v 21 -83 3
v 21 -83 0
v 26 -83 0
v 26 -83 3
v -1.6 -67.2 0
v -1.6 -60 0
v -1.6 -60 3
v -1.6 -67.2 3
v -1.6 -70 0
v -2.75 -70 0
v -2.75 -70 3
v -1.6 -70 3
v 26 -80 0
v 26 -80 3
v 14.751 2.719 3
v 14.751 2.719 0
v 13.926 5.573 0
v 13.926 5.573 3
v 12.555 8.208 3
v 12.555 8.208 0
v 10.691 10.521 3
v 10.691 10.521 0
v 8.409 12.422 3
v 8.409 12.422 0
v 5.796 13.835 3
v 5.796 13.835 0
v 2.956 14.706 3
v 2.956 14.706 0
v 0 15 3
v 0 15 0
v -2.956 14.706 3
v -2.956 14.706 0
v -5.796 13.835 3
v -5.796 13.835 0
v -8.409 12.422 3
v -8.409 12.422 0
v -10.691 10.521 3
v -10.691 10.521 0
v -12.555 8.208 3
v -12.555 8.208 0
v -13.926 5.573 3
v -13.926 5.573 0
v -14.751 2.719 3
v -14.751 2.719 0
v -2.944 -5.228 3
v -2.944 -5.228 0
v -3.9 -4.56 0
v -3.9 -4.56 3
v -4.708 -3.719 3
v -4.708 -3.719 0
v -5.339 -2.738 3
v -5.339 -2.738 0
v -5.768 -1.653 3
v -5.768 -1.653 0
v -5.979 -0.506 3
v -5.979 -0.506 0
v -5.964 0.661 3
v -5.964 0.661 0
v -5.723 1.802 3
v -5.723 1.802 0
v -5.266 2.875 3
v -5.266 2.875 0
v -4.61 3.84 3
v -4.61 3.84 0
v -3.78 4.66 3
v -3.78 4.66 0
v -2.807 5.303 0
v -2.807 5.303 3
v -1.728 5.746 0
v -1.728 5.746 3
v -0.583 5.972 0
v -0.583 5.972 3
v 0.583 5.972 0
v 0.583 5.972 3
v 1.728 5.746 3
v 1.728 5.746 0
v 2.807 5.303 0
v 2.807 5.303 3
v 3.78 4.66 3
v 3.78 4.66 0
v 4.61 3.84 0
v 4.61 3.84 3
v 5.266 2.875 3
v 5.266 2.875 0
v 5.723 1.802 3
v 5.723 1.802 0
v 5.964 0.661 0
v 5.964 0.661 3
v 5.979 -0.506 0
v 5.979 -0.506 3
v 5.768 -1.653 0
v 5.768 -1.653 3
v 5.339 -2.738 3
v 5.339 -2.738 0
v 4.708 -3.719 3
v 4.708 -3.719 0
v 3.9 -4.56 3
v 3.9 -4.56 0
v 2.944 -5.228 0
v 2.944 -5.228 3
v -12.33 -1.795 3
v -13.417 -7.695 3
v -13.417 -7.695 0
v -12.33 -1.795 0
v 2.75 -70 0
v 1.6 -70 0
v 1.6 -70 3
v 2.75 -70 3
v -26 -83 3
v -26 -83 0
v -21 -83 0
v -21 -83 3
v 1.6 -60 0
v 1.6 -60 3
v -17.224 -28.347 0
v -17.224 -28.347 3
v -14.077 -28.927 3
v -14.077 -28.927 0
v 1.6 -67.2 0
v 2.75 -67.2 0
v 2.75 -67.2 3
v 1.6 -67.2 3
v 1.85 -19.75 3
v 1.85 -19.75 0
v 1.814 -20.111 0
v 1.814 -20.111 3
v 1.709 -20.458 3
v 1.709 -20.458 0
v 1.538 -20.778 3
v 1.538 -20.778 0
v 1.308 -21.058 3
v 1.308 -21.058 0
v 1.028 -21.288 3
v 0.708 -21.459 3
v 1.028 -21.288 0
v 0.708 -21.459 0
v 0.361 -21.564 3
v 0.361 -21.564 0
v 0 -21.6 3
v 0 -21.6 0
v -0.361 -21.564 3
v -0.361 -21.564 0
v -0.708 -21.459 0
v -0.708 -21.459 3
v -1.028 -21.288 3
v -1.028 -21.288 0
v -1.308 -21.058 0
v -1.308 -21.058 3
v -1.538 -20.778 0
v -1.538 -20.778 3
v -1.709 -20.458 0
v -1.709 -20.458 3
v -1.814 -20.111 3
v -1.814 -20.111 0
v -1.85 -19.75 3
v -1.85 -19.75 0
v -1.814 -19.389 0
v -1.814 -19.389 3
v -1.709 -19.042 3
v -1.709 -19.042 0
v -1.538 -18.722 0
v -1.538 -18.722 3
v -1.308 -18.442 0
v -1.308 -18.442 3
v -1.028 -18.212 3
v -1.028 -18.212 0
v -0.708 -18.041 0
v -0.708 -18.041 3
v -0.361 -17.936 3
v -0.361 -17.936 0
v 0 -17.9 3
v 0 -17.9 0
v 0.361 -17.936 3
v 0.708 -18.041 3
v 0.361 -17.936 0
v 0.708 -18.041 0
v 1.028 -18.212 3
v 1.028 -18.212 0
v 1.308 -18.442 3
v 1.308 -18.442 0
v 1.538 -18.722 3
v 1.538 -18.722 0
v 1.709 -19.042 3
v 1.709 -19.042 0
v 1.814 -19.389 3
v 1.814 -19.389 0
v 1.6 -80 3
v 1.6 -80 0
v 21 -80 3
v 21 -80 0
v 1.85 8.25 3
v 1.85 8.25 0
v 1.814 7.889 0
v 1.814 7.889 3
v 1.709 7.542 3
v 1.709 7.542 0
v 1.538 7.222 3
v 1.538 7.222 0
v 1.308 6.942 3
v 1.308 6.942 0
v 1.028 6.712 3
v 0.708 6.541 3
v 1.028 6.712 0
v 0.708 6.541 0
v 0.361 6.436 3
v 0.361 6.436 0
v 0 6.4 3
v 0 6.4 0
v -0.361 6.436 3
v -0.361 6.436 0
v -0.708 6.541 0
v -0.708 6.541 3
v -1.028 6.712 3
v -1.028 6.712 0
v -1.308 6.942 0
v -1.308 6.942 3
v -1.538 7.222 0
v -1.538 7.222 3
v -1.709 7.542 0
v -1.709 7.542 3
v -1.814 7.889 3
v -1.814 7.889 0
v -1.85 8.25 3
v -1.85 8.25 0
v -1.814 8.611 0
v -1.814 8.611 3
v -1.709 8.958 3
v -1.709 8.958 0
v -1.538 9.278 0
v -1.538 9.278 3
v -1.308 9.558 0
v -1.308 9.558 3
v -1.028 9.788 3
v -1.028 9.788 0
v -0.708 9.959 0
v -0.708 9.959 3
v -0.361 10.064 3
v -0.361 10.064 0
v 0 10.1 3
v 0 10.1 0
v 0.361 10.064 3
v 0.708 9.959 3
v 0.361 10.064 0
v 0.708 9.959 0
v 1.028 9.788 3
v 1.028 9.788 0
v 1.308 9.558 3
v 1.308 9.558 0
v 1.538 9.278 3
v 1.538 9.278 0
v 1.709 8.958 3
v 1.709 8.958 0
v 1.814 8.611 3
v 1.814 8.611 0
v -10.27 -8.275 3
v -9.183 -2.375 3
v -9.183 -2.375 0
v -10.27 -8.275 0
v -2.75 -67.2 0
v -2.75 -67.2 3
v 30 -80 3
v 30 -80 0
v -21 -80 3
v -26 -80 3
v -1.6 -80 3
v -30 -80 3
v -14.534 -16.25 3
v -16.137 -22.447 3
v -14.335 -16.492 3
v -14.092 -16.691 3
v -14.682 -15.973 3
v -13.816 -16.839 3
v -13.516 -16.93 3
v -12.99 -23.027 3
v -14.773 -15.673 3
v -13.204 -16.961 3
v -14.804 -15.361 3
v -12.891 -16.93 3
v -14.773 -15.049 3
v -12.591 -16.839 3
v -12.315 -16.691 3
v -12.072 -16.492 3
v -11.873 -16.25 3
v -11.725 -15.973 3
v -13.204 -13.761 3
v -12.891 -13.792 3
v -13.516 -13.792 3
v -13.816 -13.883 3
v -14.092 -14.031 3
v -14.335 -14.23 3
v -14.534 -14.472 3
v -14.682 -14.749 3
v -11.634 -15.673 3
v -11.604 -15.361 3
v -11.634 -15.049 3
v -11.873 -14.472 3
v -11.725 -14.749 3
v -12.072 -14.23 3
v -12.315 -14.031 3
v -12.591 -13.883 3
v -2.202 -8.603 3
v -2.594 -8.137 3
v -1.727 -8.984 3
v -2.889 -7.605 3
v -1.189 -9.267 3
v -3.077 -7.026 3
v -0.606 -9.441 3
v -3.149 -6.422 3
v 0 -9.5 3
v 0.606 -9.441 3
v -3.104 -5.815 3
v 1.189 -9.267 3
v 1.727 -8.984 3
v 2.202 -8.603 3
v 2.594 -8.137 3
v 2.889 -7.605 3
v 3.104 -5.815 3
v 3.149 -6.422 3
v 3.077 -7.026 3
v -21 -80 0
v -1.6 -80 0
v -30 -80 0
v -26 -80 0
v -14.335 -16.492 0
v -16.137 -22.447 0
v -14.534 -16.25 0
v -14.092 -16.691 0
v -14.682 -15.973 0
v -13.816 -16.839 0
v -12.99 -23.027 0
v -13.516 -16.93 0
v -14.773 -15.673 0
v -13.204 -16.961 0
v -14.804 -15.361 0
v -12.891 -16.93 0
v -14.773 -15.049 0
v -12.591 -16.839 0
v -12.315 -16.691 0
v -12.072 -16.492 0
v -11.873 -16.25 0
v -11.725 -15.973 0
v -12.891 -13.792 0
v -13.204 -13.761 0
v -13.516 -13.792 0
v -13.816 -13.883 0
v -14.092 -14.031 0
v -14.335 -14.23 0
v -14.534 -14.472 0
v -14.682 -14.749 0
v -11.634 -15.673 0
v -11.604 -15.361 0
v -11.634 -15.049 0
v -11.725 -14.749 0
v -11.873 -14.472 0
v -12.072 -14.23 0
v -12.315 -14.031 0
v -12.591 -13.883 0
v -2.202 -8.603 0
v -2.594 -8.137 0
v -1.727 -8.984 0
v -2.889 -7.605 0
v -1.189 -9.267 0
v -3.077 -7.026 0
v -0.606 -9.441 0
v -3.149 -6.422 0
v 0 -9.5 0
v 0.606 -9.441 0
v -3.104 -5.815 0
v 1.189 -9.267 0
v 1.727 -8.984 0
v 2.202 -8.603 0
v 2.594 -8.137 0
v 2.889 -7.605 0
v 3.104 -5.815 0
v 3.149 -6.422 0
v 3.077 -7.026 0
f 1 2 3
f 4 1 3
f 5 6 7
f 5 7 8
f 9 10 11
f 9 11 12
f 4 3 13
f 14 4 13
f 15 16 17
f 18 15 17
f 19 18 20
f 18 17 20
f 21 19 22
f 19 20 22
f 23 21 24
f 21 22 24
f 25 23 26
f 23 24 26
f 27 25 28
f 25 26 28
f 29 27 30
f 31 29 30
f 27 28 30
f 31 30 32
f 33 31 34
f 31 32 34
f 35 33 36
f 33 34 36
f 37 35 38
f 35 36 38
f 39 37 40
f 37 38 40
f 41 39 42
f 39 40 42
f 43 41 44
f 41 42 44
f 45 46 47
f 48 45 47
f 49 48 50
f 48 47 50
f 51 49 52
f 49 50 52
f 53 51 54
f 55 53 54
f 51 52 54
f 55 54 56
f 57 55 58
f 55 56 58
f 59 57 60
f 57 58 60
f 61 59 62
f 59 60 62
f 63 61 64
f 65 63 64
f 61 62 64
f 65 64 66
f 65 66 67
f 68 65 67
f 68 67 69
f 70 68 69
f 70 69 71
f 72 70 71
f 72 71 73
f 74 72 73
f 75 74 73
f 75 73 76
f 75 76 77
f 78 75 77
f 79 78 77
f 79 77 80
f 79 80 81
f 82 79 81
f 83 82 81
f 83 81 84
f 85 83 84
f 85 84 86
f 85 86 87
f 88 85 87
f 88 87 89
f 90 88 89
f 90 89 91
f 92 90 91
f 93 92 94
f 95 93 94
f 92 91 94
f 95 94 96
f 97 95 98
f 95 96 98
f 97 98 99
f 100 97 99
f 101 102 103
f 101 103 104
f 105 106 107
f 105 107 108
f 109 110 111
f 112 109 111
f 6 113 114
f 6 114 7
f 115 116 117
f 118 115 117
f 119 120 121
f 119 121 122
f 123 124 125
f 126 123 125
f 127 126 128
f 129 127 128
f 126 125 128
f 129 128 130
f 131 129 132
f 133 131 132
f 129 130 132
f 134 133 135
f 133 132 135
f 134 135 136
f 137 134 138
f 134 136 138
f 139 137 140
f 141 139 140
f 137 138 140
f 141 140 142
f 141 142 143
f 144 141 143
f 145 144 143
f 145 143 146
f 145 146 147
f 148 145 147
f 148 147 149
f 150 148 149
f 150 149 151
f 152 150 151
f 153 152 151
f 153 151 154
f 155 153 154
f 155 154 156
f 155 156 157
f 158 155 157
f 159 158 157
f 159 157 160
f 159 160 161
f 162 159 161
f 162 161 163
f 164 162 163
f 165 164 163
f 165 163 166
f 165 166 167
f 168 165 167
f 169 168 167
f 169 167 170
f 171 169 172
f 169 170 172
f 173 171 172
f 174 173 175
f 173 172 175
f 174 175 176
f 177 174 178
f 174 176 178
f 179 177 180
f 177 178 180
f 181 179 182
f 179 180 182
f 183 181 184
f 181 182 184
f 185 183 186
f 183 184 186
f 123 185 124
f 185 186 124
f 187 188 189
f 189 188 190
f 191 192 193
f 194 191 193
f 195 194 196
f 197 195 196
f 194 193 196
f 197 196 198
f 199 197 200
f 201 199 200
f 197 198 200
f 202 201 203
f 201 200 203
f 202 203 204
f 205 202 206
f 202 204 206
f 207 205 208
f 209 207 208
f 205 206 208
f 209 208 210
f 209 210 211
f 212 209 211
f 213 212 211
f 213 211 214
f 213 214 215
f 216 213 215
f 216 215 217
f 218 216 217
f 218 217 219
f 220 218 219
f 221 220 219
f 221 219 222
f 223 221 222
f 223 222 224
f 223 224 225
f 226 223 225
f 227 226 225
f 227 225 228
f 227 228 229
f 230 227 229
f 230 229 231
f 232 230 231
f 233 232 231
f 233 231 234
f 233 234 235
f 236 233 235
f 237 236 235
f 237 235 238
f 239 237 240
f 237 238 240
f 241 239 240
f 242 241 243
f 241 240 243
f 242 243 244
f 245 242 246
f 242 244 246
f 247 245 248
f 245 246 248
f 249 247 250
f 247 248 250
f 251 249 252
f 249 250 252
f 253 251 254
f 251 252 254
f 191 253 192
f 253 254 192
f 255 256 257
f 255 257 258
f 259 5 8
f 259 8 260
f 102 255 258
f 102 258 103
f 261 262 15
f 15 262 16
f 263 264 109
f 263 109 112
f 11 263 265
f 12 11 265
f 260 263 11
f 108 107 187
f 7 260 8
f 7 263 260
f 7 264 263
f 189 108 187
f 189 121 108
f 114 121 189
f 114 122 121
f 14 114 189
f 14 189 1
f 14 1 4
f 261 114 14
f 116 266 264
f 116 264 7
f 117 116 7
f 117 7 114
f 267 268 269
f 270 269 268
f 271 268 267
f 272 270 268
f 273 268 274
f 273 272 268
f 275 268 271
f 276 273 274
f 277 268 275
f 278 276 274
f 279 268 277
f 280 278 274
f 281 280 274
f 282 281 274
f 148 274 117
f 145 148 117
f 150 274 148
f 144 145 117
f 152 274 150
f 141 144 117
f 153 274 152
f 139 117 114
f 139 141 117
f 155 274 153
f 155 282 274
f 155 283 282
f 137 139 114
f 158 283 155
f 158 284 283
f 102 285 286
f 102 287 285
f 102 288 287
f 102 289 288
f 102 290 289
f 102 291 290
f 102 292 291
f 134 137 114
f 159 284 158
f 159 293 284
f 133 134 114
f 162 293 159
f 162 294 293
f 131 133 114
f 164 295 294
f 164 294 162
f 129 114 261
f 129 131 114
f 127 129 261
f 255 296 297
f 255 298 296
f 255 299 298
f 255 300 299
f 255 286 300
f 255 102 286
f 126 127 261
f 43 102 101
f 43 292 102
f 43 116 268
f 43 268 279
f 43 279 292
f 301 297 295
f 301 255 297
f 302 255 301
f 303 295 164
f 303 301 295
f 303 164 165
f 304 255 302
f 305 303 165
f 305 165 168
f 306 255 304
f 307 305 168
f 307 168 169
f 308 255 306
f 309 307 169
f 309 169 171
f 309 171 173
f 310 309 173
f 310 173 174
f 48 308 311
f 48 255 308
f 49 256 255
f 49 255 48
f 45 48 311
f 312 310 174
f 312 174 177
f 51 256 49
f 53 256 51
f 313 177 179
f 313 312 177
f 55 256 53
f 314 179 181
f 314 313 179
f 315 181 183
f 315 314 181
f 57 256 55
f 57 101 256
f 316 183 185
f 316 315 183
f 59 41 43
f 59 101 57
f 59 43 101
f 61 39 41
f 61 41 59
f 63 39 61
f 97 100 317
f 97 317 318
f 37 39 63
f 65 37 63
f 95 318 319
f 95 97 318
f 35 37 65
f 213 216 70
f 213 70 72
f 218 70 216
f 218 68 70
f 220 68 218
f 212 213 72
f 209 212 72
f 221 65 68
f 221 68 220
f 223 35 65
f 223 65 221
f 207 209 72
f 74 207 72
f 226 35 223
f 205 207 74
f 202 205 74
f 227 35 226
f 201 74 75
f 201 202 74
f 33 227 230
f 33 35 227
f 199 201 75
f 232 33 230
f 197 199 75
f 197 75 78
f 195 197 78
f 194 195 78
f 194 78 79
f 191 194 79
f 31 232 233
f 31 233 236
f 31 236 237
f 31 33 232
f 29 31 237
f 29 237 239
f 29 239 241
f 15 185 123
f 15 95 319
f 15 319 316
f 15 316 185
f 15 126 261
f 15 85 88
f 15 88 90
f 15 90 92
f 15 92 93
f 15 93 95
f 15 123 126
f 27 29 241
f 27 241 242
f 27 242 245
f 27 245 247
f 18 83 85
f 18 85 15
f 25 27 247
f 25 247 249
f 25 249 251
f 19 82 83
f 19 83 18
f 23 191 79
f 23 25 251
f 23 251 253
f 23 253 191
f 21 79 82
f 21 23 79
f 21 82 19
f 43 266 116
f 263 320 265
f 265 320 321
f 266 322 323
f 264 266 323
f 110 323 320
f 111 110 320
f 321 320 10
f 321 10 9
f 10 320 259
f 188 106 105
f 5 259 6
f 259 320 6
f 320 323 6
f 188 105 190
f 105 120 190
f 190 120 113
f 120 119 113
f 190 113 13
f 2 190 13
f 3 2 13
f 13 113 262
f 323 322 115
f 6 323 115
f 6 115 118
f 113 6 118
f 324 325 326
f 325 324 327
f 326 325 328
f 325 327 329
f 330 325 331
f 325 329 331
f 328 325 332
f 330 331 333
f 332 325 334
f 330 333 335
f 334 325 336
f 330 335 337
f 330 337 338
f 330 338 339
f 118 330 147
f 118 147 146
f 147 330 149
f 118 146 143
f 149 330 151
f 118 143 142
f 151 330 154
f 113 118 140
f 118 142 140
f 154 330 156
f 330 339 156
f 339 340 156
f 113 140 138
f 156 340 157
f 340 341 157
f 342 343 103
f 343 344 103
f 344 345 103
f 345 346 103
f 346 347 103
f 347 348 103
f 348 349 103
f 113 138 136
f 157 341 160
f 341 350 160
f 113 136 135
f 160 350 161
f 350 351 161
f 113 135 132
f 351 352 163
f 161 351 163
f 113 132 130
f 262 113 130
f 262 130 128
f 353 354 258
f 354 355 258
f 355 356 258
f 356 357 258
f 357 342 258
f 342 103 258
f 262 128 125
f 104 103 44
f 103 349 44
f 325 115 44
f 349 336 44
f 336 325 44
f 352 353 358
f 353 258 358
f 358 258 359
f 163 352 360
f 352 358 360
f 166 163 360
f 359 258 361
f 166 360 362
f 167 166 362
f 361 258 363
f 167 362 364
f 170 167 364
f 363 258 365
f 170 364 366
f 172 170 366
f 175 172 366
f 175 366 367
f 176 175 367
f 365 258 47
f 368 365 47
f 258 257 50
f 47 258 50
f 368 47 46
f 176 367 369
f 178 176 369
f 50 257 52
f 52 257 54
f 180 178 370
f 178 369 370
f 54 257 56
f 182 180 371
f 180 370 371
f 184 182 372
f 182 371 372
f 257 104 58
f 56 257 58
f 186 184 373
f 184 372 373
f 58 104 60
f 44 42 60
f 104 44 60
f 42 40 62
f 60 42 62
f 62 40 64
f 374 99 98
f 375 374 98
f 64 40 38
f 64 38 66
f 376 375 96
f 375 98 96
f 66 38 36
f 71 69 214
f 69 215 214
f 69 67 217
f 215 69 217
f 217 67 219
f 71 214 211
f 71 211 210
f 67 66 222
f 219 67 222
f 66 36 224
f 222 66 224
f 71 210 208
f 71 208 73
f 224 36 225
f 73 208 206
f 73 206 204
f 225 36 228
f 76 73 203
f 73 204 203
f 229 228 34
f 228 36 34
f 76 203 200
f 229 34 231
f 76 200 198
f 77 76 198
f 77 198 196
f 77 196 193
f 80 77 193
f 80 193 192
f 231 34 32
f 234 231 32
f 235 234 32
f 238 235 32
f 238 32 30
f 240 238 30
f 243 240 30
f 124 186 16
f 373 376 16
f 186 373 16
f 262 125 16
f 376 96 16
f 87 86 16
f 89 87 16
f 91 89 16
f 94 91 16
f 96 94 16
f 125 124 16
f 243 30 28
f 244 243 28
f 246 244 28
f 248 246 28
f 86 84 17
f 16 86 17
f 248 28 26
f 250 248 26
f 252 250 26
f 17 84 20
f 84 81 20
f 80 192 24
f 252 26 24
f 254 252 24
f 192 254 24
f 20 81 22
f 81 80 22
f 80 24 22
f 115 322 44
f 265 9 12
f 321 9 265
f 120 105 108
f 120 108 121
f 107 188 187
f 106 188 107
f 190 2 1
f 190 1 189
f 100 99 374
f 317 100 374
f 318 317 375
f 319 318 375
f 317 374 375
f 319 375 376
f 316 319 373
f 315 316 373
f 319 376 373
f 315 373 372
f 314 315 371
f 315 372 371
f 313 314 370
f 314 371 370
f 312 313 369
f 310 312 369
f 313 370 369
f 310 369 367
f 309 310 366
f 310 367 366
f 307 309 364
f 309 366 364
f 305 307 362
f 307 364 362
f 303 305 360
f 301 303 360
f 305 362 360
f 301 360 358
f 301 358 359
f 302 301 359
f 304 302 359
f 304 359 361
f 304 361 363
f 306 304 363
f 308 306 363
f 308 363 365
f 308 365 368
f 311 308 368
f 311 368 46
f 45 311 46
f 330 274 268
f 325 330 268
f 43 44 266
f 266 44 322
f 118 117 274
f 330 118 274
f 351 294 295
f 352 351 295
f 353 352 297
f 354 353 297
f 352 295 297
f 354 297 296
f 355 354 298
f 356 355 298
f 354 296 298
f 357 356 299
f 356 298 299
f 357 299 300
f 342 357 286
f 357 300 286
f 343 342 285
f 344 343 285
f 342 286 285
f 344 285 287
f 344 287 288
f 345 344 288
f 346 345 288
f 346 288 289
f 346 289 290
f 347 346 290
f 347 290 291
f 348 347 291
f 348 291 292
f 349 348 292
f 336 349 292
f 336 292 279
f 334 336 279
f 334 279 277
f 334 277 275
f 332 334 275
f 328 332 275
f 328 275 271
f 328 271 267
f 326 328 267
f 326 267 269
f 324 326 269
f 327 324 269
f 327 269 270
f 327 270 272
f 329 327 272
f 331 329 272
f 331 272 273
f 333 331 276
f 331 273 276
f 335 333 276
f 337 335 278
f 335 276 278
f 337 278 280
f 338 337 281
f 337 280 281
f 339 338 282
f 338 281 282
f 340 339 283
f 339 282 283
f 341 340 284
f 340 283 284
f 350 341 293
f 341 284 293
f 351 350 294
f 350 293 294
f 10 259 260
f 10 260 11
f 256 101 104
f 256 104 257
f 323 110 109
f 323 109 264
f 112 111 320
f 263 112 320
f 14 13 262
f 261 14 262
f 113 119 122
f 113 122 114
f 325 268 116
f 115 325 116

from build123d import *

# Parameters (mm, degrees)
PAD004_DEPTH    = 3
SKETCH006_W     = 5
SKETCH006_H     = 3
PAD005_DEPTH    = 3
SKETCH008_R     = 1.85
POCKET002_DEPTH = 3.001
POCKET009_DEPTH = 3.001
SKETCH019_R     = 1.6
POCKET012_DEPTH = 3.001


with BuildPart() as part:
    # Sketch005 → Pad004 (new body)
    with BuildSketch(Plane.XY):
        with BuildLine():
            ThreePointArc((14.751455, 2.719296), (0, 15), (-14.751455, 2.719296))
            Line((-14.751455, 2.719296), (-30, -80))
            Line((-30, -80), (30, -80))
            Line((30, -80), (14.751455, 2.719296))
        make_face()
    extrude(amount=PAD004_DEPTH)

    # Sketch006 → Pad005 (join)
    with BuildSketch(Plane.XY):
        with Locations((-23.5, -81.5)):
            Rectangle(SKETCH006_W, SKETCH006_H)
        with Locations((23.5, -81.5)):
            Rectangle(SKETCH006_W, SKETCH006_H)
    extrude(amount=PAD005_DEPTH)

    # Sketch008 (on Face13 of Pad005) → Pocket002 (cut, through all)
    with BuildSketch(Plane(origin=(0, 0, 0), x_dir=(1, 0, 0), z_dir=(0, 0, -1))):
        with Locations((0, -8.25)):
            Circle(SKETCH008_R)
        with Locations((0, 19.75)):
            Circle(SKETCH008_R)
        with BuildLine():
            ThreePointArc((-2.943534, 5.228346), (0, -6), (2.943534, 5.228346))
            ThreePointArc((2.943534, 5.228346), (0, 9.5), (-2.943534, 5.228346))
        make_face()
    extrude(amount=-POCKET002_DEPTH, mode=Mode.SUBTRACT)

    # Sketch016 (on Face2 of Pocket002) → Pocket009 (cut, through all)
    with BuildSketch(Plane(origin=(0, 0, 0), x_dir=(1, 0, 0), z_dir=(0, 0, -1))):
        Polygon((-1.6, 80), (1.6, 80), (1.6, 70), (2.75, 70), (2.75, 67.2), (1.6, 67.2), (1.6, 60), (-1.6, 60), (-1.6, 67.2), (-2.75, 67.2), (-2.75, 70), (-1.6, 70), align=None)
    extrude(amount=-POCKET009_DEPTH, mode=Mode.SUBTRACT)

    # Sketch019 (on Face4 of Pocket009) → Pocket012 (cut, through all)
    with BuildSketch(Plane.XY.offset(3)):
        with Locations((-13.203501, -15.36091)):
            Circle(SKETCH019_R)
        Polygon((-13.417342, -7.695124), (-12.329624, -1.794542), (-9.182647, -2.374659), (-10.270365, -8.275241), align=None)
        Polygon((-12.98966, -23.026696), (-16.136638, -22.446579), (-17.224356, -28.347161), (-14.077379, -28.927278), align=None)
    extrude(amount=-POCKET012_DEPTH, mode=Mode.SUBTRACT)


solid = part.part
